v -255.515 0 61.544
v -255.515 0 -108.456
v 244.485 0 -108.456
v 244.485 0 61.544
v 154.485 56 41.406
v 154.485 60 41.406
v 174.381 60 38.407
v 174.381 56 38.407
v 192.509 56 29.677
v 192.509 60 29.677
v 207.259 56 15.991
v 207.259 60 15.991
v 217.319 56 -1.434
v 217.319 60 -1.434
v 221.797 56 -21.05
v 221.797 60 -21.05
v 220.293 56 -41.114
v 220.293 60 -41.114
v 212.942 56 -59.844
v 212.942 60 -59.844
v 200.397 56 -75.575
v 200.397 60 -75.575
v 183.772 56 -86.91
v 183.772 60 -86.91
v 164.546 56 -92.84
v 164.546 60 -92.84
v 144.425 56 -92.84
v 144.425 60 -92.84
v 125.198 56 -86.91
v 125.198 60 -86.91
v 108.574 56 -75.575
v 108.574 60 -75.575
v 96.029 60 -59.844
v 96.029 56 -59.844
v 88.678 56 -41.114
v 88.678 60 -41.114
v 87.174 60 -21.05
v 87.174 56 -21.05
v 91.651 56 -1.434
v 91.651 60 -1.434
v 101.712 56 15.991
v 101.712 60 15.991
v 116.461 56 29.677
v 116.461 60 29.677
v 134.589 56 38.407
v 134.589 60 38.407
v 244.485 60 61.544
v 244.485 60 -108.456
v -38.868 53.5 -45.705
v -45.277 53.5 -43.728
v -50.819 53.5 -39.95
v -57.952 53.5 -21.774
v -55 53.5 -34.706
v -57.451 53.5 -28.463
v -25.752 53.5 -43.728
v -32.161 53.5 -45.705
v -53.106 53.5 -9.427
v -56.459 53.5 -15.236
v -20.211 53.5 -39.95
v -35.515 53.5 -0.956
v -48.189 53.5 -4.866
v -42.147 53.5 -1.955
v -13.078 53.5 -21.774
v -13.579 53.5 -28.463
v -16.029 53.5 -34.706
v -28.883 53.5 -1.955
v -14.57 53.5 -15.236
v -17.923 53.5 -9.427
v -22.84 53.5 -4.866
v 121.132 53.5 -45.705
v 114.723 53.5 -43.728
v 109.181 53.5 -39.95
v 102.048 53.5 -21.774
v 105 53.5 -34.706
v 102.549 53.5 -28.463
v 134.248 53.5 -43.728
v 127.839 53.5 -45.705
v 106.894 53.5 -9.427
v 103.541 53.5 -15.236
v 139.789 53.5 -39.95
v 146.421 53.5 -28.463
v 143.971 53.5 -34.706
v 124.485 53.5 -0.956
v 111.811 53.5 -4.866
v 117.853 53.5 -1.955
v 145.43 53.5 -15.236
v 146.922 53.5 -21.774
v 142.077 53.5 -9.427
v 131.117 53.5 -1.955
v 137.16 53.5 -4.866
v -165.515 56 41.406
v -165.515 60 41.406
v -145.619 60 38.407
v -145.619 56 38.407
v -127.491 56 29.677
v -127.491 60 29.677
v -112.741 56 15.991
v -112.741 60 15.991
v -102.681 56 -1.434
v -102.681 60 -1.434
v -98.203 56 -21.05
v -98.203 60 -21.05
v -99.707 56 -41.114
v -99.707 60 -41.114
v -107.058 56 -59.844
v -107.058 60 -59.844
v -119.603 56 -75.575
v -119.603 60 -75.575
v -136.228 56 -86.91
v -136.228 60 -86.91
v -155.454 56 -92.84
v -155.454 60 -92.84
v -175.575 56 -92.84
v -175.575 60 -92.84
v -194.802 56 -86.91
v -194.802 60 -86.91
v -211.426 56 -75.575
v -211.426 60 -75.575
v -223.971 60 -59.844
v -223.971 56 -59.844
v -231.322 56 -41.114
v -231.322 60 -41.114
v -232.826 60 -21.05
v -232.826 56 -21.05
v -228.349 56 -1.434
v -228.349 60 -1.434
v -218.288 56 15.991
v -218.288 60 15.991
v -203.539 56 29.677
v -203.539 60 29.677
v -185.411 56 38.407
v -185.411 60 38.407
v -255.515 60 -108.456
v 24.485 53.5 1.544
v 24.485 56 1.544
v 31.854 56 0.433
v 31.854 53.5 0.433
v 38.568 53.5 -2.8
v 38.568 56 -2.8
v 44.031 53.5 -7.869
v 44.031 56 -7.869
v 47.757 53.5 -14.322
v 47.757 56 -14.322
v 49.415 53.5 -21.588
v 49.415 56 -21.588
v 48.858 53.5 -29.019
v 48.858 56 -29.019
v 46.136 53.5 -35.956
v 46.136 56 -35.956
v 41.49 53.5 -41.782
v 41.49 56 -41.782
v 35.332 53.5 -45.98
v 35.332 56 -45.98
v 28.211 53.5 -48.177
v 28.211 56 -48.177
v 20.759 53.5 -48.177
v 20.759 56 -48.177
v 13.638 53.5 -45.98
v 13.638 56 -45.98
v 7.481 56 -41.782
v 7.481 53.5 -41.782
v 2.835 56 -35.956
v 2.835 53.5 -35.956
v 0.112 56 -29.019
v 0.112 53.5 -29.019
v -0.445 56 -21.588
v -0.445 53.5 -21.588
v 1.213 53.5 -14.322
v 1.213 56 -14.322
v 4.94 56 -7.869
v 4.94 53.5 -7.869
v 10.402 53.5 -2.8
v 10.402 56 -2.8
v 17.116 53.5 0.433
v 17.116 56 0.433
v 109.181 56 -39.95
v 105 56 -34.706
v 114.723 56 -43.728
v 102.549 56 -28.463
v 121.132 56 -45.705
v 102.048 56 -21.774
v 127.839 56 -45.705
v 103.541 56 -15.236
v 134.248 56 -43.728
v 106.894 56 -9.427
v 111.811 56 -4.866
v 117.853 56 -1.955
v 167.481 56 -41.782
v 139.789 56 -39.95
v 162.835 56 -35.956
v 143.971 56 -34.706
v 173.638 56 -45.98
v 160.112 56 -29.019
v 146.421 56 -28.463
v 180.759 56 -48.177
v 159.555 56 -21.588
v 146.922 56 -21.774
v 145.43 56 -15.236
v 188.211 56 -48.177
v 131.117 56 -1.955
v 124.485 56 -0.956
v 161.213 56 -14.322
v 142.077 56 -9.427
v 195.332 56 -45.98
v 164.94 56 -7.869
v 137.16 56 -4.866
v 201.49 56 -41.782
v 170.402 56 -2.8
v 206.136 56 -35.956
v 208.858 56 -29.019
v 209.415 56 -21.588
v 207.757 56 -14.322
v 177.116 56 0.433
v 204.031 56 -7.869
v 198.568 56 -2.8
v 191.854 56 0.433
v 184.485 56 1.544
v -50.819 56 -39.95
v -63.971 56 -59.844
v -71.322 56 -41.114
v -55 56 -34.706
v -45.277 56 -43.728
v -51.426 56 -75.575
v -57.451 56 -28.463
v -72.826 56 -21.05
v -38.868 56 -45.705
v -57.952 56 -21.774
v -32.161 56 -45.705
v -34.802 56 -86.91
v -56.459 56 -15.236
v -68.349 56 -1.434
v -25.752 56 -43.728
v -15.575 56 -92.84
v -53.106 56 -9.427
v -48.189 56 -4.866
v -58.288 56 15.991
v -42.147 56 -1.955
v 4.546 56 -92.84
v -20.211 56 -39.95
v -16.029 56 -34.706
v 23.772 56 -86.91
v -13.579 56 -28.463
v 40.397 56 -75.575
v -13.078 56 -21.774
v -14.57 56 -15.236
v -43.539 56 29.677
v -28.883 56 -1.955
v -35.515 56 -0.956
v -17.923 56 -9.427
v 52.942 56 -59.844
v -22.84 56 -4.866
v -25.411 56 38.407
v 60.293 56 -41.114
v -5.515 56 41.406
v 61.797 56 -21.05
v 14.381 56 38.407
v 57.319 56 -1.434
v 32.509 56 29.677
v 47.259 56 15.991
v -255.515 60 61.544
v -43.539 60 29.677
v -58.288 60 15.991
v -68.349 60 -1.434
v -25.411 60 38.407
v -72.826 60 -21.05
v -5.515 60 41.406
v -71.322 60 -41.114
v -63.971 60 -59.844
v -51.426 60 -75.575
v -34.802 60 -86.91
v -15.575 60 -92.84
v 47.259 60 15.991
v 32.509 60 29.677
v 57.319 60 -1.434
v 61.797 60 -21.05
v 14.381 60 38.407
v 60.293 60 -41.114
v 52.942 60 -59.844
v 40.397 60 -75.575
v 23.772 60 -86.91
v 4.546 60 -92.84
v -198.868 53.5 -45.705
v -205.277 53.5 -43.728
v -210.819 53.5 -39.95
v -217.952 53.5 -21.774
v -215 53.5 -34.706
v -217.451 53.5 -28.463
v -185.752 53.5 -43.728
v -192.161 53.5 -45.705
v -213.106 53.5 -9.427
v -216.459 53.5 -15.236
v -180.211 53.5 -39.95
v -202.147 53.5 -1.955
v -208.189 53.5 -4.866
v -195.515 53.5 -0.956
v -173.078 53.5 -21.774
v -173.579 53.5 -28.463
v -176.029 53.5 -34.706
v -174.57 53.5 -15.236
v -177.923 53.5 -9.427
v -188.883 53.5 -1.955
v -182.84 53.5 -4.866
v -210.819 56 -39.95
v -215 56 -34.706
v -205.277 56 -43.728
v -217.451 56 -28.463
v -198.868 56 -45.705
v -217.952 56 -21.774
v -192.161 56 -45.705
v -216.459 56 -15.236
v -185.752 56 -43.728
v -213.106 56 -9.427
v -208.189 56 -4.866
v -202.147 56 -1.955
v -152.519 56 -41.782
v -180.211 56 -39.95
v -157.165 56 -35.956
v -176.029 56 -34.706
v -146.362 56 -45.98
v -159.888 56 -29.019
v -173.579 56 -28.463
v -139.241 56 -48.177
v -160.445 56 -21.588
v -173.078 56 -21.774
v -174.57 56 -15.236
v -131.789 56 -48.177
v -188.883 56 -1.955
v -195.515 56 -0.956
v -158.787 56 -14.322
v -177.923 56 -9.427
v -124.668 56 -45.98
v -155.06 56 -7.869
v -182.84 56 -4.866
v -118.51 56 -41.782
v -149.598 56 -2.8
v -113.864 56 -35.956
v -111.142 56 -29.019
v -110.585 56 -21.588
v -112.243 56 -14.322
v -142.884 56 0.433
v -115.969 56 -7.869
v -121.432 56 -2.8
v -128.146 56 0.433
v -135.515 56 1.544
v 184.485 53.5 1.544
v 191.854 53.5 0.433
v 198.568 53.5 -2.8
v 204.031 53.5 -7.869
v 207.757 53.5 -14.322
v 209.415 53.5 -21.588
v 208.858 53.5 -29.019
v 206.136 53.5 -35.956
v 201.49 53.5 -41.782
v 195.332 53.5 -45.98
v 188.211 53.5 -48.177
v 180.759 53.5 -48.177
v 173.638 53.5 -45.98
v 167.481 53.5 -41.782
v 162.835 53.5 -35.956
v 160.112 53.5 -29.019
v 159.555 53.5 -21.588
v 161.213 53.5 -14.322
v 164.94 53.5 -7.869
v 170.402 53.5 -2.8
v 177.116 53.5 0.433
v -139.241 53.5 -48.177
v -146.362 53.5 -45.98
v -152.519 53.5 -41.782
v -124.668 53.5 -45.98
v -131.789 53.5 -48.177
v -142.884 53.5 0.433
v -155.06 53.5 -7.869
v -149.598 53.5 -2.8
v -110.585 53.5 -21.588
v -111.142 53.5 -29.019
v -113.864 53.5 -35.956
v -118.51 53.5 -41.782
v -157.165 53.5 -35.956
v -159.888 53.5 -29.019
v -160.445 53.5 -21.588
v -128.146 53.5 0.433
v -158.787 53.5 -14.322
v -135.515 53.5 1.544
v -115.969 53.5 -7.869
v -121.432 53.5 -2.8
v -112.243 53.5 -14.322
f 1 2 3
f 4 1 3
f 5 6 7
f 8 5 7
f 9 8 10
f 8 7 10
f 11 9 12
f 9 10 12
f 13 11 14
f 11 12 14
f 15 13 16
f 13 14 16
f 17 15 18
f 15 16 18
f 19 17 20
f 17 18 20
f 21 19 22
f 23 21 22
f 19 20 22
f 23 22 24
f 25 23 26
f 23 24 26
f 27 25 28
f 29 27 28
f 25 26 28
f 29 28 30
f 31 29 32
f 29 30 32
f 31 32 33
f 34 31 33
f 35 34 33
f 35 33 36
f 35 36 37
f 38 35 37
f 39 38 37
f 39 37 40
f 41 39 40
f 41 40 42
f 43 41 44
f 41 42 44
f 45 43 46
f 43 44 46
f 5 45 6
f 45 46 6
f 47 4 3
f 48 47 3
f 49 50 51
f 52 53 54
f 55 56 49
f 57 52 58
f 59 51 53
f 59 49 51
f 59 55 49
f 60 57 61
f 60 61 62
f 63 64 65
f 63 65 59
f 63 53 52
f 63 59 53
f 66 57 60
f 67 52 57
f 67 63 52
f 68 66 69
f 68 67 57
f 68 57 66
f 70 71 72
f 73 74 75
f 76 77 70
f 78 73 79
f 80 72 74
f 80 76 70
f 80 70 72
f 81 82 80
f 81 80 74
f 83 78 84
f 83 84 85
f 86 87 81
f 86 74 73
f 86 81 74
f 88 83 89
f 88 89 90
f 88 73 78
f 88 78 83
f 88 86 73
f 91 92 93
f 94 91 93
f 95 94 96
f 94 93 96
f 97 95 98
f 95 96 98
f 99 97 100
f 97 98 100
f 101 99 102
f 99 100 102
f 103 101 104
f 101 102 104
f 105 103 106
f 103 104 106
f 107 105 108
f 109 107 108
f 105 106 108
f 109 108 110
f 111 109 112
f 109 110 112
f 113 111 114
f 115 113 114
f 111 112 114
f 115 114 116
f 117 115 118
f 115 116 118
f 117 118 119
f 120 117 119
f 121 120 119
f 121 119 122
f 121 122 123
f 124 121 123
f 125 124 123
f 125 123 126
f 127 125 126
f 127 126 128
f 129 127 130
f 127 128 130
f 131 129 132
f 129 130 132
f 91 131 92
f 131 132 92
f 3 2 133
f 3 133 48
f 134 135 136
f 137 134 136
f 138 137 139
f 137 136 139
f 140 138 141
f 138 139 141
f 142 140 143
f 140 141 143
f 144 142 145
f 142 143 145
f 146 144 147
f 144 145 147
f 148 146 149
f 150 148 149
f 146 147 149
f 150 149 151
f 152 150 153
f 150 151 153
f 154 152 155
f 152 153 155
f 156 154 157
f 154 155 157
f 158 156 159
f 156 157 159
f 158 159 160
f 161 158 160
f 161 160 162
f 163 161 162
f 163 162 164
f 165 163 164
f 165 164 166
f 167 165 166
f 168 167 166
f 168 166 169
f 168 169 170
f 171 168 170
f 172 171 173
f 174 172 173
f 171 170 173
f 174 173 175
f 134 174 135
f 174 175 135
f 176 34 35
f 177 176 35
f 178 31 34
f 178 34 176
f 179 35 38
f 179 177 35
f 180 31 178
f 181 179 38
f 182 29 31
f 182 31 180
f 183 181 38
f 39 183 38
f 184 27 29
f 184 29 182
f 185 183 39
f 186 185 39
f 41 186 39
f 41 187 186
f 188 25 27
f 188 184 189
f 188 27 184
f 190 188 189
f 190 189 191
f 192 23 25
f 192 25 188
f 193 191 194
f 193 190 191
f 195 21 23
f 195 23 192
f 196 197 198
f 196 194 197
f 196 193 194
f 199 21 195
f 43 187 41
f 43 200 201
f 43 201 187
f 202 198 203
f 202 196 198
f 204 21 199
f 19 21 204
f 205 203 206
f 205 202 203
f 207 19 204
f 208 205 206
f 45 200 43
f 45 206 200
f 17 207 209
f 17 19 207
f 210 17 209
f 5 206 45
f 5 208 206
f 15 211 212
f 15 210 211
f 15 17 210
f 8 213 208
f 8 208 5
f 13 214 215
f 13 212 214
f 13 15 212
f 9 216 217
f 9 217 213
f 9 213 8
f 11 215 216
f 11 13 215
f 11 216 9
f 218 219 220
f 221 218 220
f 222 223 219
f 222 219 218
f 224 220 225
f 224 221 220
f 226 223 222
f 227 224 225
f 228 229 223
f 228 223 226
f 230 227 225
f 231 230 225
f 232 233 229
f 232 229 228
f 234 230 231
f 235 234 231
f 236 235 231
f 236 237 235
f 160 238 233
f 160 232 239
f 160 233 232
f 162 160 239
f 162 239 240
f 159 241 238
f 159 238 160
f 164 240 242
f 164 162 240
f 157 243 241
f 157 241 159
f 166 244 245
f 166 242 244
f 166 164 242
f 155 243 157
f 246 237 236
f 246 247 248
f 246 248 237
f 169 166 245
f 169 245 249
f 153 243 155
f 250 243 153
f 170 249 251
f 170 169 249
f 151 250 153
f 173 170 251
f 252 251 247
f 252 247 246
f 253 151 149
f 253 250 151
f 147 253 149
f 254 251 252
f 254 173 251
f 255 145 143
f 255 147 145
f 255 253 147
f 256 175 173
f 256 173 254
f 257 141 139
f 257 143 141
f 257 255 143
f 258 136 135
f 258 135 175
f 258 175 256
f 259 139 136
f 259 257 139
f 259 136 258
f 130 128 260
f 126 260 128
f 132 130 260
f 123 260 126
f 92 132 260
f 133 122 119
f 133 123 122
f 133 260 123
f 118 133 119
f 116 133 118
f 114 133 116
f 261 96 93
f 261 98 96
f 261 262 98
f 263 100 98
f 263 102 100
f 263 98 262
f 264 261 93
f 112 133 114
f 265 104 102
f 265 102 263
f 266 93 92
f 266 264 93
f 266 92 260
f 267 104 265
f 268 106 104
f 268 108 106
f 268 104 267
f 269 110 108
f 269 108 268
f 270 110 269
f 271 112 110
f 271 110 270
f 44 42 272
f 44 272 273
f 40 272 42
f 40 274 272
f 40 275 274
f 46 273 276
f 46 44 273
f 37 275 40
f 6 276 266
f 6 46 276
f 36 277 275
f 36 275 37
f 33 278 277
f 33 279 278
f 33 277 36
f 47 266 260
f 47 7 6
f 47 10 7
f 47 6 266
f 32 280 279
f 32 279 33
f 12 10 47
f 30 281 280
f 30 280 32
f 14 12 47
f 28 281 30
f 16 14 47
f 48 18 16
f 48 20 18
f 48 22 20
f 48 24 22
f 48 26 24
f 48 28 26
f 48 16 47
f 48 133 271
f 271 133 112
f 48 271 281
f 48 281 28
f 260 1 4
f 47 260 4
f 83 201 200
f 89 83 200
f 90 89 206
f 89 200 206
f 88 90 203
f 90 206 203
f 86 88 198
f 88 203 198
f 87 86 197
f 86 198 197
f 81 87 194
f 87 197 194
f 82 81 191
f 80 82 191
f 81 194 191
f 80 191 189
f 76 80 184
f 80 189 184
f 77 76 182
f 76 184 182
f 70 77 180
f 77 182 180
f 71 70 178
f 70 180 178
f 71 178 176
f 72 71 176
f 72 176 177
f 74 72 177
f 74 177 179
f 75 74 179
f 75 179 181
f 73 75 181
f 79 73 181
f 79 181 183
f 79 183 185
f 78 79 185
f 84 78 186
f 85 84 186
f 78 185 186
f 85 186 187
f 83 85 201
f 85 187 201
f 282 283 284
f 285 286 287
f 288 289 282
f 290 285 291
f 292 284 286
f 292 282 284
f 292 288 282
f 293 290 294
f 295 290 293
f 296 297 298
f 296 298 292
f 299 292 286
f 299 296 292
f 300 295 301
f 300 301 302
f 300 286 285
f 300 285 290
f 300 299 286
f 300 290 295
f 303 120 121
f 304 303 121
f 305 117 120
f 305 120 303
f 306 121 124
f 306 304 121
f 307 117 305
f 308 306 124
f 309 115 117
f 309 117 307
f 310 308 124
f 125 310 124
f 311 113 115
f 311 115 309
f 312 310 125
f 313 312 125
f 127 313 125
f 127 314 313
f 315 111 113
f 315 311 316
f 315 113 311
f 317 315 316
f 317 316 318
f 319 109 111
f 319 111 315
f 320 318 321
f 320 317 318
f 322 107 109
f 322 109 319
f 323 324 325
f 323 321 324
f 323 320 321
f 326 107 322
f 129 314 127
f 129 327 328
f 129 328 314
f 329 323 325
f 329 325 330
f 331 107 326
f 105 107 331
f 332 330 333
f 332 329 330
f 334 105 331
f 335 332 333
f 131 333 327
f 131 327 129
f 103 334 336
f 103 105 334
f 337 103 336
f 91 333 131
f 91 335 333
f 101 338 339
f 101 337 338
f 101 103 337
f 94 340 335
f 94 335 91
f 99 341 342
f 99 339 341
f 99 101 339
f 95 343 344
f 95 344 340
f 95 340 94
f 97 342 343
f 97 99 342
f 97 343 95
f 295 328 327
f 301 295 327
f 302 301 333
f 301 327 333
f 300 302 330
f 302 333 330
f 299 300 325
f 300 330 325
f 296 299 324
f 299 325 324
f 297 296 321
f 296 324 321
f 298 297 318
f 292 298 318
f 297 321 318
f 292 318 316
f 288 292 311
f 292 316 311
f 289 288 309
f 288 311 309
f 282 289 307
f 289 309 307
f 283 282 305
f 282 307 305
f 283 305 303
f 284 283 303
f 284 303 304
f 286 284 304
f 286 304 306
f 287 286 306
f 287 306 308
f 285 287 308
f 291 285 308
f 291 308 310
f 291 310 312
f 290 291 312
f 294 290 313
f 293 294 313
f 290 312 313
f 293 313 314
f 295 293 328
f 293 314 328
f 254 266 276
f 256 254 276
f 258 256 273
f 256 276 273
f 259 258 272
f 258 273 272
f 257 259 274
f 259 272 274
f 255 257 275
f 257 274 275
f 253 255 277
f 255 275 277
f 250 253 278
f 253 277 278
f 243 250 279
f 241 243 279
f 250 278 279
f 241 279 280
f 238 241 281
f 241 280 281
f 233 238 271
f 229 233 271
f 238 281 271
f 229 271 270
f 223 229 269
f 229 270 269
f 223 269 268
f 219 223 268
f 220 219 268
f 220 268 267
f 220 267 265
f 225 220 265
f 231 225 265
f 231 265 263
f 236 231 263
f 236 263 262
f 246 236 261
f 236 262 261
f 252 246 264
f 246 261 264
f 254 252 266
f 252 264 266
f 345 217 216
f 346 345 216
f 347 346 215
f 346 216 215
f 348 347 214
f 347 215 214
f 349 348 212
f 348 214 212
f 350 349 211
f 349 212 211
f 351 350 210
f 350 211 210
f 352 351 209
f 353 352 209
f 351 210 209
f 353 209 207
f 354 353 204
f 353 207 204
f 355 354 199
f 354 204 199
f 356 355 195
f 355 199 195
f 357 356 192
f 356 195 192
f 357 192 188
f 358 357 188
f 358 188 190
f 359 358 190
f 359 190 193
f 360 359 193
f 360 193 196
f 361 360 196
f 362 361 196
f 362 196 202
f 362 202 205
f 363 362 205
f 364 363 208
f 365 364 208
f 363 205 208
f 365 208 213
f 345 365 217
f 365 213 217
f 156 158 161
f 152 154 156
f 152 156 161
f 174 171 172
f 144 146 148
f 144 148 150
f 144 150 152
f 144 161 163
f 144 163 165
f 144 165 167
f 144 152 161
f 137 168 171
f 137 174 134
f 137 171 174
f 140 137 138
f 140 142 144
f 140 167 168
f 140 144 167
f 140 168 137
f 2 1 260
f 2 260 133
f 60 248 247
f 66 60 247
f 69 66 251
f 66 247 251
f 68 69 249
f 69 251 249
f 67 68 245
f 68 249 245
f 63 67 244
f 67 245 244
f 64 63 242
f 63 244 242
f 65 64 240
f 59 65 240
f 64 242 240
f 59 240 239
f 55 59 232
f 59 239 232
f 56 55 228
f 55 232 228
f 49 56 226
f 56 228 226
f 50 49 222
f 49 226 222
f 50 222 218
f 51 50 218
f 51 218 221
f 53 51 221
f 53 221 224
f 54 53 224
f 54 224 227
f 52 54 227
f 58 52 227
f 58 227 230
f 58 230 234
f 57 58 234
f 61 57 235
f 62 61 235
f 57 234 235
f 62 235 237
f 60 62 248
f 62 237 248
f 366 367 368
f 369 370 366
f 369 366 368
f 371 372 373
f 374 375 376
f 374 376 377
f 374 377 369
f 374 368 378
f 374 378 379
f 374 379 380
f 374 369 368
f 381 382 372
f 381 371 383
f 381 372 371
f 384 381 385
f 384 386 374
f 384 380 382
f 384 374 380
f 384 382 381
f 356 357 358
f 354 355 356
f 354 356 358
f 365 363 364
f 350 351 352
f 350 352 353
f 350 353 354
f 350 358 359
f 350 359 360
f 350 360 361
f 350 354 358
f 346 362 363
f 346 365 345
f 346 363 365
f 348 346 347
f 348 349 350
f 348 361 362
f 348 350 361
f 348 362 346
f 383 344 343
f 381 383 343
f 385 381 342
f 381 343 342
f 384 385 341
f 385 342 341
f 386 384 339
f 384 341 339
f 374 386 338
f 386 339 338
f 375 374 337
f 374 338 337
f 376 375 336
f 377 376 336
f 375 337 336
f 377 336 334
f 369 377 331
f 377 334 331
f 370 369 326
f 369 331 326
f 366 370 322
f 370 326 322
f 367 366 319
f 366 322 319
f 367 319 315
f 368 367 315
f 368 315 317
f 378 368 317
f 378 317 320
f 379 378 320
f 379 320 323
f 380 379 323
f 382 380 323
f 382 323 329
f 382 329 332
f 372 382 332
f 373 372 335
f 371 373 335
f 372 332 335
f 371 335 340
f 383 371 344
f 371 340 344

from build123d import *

# Parameters (mm, degrees)
SKETCH1_W           = 500
SKETCH1_H           = 170
BOSS_EXTRUDE1_DEPTH = 60
SKETCH3_R           = 67.5
CUT_EXTRUDE1_DEPTH  = 4
SKETCH4_R           = 25
SKETCH4_R_2         = 22.5
CUT_EXTRUDE2_DEPTH  = 2.5


with BuildPart() as part:
    # Sketch1 → Boss-Extrude1 (new body)
    with BuildSketch(Plane(origin=(0, 0, 0), x_dir=(1, 0, 0), z_dir=(0, 1, 0))):
        with Locations((-5.514705882, 23.455882353)):
            Rectangle(SKETCH1_W, SKETCH1_H)
    extrude(amount=BOSS_EXTRUDE1_DEPTH)

    # Sketch3 → Cut-Extrude1 (cut)
    with BuildSketch(Plane(origin=(0, 60, 0), x_dir=(1, 0, 0), z_dir=(0, 1, 0))):
        with Locations(Location((-5.514705882, 26.094123359, 0), (0, 0, 270))):
            Circle(SKETCH3_R)
        with Locations(Location((154.485294118, 26.094123359, 0), (0, 0, 270))):
            Circle(SKETCH3_R)
        with Locations(Location((-165.514705882, 26.094123359, 0), (0, 0, 270))):
            Circle(SKETCH3_R)
    extrude(amount=-CUT_EXTRUDE1_DEPTH, mode=Mode.SUBTRACT)

    # Sketch4 → Cut-Extrude2 (cut)
    with BuildSketch(Plane(origin=(0, 56, 0), x_dir=(1, 0, 0), z_dir=(0, 1, 0))):
        with Locations(Location((-135.514705882, 23.455882353, 0), (0, 0, 270))):
            Circle(SKETCH4_R)
        with Locations(Location((-195.514705882, 23.455882353, 0), (0, 0, 270))):
            Circle(SKETCH4_R_2)
        with Locations(Location((-35.514705882, 23.455882353, 0), (0, 0, 270))):
            Circle(SKETCH4_R_2)
        with Locations(Location((24.485294118, 23.455882353, 0), (0, 0, 270))):
            Circle(SKETCH4_R)
        with Locations(Location((124.485294118, 23.455882353, 0), (0, 0, 270))):
            Circle(SKETCH4_R_2)
        with Locations(Location((184.485294118, 23.455882353, 0), (0, 0, 270))):
            Circle(SKETCH4_R)
    extrude(amount=-CUT_EXTRUDE2_DEPTH, mode=Mode.SUBTRACT)


solid = part.part
